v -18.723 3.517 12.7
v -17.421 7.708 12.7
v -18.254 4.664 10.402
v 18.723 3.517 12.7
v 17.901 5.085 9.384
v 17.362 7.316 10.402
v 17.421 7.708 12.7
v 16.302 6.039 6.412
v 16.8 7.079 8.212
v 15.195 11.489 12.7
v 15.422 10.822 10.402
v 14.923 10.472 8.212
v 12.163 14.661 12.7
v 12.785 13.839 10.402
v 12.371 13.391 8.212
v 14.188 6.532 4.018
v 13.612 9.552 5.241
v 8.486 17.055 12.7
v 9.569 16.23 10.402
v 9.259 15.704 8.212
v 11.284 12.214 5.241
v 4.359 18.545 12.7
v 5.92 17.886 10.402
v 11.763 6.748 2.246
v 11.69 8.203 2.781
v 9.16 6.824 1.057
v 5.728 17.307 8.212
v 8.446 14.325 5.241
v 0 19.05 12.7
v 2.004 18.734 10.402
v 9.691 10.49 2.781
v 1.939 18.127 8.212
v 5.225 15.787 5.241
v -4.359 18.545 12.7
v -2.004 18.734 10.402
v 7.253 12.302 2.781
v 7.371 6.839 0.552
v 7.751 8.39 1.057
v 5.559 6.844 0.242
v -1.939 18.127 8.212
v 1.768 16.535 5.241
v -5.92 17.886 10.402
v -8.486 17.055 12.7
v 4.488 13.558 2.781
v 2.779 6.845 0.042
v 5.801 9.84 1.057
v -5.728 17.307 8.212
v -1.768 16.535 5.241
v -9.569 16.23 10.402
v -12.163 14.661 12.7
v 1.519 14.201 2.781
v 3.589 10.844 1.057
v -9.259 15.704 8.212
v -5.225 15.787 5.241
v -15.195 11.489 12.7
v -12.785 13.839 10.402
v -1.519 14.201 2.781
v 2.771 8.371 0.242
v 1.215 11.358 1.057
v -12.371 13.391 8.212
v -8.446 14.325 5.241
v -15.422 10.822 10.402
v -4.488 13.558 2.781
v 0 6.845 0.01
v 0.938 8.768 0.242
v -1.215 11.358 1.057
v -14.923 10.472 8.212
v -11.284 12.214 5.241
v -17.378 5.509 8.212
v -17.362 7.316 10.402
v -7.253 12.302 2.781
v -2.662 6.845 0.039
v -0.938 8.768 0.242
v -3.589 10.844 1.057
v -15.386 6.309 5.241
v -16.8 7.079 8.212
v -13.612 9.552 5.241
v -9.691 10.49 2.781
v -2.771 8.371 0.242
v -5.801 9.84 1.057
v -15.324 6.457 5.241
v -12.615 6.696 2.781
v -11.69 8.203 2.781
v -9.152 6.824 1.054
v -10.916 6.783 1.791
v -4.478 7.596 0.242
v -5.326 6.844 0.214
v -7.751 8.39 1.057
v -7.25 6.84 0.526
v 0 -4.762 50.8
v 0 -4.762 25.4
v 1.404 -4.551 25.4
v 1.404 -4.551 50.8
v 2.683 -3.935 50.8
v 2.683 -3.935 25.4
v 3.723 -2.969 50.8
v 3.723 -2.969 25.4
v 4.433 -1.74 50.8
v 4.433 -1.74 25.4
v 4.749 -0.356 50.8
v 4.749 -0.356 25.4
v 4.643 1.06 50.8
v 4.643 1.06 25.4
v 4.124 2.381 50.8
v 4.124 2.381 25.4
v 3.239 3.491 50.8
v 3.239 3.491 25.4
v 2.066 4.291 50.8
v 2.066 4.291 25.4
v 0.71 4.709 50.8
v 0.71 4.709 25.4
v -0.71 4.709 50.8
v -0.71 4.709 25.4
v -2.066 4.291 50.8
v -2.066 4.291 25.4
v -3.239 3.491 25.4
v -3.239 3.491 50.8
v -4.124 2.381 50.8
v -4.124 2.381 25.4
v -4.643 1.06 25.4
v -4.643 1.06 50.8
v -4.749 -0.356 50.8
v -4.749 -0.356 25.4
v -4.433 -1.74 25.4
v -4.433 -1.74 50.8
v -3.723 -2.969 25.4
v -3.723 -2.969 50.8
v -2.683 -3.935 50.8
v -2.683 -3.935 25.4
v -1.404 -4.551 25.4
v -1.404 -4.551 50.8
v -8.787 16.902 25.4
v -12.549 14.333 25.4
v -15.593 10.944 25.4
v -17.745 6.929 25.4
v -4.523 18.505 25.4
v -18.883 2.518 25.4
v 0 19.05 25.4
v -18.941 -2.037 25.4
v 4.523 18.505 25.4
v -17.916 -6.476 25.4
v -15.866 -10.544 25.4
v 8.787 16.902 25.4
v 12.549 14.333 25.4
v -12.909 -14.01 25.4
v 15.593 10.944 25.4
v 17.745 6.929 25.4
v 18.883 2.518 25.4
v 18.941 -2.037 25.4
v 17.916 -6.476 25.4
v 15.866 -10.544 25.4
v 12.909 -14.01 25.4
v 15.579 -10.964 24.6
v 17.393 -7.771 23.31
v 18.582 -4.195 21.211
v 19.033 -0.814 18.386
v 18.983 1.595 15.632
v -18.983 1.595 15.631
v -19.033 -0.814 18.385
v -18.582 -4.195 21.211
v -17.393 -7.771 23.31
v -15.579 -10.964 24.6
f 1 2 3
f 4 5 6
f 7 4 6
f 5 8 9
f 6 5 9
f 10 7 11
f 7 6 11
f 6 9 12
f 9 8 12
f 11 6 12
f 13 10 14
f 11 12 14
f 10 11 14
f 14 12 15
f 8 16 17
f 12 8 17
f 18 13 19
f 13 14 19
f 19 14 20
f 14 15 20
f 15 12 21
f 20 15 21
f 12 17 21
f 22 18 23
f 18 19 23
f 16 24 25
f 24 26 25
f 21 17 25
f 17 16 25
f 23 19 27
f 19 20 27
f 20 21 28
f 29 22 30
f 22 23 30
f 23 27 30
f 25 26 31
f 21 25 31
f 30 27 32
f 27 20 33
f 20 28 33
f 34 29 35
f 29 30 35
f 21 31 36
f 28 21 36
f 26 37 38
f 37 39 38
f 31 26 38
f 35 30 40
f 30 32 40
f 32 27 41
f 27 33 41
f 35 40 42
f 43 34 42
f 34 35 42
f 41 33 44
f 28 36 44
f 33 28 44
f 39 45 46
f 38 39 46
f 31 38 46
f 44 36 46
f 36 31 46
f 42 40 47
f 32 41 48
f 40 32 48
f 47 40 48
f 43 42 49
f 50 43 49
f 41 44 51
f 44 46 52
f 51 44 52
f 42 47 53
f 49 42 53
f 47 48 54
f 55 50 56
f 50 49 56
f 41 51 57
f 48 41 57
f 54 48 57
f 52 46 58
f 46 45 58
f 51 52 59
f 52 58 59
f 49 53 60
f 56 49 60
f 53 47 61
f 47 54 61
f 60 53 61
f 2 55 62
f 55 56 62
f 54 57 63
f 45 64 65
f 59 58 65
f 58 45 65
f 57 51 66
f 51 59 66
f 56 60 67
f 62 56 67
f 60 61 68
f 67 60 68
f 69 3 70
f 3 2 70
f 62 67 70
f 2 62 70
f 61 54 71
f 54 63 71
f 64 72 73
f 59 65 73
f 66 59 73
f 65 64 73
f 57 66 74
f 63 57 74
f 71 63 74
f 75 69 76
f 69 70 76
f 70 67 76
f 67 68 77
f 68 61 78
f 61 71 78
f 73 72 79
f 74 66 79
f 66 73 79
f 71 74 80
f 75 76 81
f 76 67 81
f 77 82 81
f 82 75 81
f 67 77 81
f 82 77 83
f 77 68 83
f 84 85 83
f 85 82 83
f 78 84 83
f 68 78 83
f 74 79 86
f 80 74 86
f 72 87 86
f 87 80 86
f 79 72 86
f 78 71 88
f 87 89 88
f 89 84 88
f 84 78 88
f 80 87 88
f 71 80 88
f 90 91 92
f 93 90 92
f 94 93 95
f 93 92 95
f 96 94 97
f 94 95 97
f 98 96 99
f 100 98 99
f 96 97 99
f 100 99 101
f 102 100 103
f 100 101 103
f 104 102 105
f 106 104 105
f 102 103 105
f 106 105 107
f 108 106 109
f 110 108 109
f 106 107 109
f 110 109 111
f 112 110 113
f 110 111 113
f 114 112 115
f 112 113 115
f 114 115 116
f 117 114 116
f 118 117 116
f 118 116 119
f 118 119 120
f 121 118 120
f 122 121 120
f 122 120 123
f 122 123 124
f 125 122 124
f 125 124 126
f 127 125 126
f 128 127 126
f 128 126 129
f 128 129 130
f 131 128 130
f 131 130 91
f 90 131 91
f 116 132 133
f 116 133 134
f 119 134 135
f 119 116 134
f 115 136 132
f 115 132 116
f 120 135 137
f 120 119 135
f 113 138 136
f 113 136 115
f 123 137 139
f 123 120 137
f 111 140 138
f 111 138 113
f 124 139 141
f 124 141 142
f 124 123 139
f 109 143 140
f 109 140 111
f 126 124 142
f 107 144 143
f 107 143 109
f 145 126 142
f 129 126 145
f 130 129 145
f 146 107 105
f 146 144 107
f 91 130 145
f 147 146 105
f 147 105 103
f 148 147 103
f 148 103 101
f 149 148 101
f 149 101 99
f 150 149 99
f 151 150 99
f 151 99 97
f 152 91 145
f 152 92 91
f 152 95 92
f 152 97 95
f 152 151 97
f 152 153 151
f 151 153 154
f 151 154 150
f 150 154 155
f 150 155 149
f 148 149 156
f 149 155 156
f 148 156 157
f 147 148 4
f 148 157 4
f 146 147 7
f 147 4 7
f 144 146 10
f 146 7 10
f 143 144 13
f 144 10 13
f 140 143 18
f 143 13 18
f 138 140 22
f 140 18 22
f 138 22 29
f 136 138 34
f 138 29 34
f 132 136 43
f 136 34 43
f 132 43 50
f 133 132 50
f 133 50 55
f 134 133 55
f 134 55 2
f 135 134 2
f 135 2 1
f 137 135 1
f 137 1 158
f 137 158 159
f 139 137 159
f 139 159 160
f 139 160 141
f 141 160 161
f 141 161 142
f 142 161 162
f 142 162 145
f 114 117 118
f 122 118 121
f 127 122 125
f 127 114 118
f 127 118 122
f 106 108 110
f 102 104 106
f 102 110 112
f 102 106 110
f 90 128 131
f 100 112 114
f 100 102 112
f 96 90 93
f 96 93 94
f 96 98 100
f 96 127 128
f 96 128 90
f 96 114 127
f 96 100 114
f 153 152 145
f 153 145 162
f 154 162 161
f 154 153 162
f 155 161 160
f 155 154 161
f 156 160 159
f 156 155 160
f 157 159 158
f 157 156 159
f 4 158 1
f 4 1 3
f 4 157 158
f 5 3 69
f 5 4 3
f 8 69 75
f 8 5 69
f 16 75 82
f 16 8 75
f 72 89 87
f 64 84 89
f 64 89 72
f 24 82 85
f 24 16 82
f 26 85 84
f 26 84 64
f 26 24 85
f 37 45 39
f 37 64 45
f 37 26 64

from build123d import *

# Parameters (mm, degrees)
F0_R     = 19.05
F0_R_2   = 4.7625
F1_DEPTH = 25.4
F2_DEPTH = 50.8
F4_R     = 12.7
F3_R     = 25.8953
F5_DEPTH = 19.051
F6_DEPTH = 25.4
F7_ANGLE = 90


with BuildPart() as f1:
    # F0 (on Top) → F1 (new body)
    with BuildSketch(Plane.XY):
        Circle(F0_R)
        Circle(F0_R_2, mode=Mode.SUBTRACT)
    extrude(amount=F1_DEPTH)

    # F0 (on Top) → F2 (join)
    with BuildSketch(Plane.XY):
        Circle(F0_R_2)
    extrude(amount=F2_DEPTH)

    # F4
    f4_edges = [f1.edges().sort_by_distance(p)[0] for p in [
        (-19.05, 0, 0),
    ]]
    fillet(f4_edges, radius=F4_R)

    # F3 (on Front) → F5 (cut, through all)
    with BuildSketch(Plane.XZ):
        with Locations((19.05, 0)):
            Circle(F3_R)
    extrude(amount=-F5_DEPTH, mode=Mode.SUBTRACT)

    # F3 (on Front) → F6 (cut)
    with BuildSketch(Plane.XZ):
        with Locations((19.05, 0)):
            Circle(F3_R)
    extrude(amount=F6_DEPTH, mode=Mode.SUBTRACT)


with BuildPart() as f1_1:
    # F7: moved
    add(f1.part.rotate(Axis((0, 0, 0), (0, 0, -1)), F7_ANGLE))


solid = f1_1.part
